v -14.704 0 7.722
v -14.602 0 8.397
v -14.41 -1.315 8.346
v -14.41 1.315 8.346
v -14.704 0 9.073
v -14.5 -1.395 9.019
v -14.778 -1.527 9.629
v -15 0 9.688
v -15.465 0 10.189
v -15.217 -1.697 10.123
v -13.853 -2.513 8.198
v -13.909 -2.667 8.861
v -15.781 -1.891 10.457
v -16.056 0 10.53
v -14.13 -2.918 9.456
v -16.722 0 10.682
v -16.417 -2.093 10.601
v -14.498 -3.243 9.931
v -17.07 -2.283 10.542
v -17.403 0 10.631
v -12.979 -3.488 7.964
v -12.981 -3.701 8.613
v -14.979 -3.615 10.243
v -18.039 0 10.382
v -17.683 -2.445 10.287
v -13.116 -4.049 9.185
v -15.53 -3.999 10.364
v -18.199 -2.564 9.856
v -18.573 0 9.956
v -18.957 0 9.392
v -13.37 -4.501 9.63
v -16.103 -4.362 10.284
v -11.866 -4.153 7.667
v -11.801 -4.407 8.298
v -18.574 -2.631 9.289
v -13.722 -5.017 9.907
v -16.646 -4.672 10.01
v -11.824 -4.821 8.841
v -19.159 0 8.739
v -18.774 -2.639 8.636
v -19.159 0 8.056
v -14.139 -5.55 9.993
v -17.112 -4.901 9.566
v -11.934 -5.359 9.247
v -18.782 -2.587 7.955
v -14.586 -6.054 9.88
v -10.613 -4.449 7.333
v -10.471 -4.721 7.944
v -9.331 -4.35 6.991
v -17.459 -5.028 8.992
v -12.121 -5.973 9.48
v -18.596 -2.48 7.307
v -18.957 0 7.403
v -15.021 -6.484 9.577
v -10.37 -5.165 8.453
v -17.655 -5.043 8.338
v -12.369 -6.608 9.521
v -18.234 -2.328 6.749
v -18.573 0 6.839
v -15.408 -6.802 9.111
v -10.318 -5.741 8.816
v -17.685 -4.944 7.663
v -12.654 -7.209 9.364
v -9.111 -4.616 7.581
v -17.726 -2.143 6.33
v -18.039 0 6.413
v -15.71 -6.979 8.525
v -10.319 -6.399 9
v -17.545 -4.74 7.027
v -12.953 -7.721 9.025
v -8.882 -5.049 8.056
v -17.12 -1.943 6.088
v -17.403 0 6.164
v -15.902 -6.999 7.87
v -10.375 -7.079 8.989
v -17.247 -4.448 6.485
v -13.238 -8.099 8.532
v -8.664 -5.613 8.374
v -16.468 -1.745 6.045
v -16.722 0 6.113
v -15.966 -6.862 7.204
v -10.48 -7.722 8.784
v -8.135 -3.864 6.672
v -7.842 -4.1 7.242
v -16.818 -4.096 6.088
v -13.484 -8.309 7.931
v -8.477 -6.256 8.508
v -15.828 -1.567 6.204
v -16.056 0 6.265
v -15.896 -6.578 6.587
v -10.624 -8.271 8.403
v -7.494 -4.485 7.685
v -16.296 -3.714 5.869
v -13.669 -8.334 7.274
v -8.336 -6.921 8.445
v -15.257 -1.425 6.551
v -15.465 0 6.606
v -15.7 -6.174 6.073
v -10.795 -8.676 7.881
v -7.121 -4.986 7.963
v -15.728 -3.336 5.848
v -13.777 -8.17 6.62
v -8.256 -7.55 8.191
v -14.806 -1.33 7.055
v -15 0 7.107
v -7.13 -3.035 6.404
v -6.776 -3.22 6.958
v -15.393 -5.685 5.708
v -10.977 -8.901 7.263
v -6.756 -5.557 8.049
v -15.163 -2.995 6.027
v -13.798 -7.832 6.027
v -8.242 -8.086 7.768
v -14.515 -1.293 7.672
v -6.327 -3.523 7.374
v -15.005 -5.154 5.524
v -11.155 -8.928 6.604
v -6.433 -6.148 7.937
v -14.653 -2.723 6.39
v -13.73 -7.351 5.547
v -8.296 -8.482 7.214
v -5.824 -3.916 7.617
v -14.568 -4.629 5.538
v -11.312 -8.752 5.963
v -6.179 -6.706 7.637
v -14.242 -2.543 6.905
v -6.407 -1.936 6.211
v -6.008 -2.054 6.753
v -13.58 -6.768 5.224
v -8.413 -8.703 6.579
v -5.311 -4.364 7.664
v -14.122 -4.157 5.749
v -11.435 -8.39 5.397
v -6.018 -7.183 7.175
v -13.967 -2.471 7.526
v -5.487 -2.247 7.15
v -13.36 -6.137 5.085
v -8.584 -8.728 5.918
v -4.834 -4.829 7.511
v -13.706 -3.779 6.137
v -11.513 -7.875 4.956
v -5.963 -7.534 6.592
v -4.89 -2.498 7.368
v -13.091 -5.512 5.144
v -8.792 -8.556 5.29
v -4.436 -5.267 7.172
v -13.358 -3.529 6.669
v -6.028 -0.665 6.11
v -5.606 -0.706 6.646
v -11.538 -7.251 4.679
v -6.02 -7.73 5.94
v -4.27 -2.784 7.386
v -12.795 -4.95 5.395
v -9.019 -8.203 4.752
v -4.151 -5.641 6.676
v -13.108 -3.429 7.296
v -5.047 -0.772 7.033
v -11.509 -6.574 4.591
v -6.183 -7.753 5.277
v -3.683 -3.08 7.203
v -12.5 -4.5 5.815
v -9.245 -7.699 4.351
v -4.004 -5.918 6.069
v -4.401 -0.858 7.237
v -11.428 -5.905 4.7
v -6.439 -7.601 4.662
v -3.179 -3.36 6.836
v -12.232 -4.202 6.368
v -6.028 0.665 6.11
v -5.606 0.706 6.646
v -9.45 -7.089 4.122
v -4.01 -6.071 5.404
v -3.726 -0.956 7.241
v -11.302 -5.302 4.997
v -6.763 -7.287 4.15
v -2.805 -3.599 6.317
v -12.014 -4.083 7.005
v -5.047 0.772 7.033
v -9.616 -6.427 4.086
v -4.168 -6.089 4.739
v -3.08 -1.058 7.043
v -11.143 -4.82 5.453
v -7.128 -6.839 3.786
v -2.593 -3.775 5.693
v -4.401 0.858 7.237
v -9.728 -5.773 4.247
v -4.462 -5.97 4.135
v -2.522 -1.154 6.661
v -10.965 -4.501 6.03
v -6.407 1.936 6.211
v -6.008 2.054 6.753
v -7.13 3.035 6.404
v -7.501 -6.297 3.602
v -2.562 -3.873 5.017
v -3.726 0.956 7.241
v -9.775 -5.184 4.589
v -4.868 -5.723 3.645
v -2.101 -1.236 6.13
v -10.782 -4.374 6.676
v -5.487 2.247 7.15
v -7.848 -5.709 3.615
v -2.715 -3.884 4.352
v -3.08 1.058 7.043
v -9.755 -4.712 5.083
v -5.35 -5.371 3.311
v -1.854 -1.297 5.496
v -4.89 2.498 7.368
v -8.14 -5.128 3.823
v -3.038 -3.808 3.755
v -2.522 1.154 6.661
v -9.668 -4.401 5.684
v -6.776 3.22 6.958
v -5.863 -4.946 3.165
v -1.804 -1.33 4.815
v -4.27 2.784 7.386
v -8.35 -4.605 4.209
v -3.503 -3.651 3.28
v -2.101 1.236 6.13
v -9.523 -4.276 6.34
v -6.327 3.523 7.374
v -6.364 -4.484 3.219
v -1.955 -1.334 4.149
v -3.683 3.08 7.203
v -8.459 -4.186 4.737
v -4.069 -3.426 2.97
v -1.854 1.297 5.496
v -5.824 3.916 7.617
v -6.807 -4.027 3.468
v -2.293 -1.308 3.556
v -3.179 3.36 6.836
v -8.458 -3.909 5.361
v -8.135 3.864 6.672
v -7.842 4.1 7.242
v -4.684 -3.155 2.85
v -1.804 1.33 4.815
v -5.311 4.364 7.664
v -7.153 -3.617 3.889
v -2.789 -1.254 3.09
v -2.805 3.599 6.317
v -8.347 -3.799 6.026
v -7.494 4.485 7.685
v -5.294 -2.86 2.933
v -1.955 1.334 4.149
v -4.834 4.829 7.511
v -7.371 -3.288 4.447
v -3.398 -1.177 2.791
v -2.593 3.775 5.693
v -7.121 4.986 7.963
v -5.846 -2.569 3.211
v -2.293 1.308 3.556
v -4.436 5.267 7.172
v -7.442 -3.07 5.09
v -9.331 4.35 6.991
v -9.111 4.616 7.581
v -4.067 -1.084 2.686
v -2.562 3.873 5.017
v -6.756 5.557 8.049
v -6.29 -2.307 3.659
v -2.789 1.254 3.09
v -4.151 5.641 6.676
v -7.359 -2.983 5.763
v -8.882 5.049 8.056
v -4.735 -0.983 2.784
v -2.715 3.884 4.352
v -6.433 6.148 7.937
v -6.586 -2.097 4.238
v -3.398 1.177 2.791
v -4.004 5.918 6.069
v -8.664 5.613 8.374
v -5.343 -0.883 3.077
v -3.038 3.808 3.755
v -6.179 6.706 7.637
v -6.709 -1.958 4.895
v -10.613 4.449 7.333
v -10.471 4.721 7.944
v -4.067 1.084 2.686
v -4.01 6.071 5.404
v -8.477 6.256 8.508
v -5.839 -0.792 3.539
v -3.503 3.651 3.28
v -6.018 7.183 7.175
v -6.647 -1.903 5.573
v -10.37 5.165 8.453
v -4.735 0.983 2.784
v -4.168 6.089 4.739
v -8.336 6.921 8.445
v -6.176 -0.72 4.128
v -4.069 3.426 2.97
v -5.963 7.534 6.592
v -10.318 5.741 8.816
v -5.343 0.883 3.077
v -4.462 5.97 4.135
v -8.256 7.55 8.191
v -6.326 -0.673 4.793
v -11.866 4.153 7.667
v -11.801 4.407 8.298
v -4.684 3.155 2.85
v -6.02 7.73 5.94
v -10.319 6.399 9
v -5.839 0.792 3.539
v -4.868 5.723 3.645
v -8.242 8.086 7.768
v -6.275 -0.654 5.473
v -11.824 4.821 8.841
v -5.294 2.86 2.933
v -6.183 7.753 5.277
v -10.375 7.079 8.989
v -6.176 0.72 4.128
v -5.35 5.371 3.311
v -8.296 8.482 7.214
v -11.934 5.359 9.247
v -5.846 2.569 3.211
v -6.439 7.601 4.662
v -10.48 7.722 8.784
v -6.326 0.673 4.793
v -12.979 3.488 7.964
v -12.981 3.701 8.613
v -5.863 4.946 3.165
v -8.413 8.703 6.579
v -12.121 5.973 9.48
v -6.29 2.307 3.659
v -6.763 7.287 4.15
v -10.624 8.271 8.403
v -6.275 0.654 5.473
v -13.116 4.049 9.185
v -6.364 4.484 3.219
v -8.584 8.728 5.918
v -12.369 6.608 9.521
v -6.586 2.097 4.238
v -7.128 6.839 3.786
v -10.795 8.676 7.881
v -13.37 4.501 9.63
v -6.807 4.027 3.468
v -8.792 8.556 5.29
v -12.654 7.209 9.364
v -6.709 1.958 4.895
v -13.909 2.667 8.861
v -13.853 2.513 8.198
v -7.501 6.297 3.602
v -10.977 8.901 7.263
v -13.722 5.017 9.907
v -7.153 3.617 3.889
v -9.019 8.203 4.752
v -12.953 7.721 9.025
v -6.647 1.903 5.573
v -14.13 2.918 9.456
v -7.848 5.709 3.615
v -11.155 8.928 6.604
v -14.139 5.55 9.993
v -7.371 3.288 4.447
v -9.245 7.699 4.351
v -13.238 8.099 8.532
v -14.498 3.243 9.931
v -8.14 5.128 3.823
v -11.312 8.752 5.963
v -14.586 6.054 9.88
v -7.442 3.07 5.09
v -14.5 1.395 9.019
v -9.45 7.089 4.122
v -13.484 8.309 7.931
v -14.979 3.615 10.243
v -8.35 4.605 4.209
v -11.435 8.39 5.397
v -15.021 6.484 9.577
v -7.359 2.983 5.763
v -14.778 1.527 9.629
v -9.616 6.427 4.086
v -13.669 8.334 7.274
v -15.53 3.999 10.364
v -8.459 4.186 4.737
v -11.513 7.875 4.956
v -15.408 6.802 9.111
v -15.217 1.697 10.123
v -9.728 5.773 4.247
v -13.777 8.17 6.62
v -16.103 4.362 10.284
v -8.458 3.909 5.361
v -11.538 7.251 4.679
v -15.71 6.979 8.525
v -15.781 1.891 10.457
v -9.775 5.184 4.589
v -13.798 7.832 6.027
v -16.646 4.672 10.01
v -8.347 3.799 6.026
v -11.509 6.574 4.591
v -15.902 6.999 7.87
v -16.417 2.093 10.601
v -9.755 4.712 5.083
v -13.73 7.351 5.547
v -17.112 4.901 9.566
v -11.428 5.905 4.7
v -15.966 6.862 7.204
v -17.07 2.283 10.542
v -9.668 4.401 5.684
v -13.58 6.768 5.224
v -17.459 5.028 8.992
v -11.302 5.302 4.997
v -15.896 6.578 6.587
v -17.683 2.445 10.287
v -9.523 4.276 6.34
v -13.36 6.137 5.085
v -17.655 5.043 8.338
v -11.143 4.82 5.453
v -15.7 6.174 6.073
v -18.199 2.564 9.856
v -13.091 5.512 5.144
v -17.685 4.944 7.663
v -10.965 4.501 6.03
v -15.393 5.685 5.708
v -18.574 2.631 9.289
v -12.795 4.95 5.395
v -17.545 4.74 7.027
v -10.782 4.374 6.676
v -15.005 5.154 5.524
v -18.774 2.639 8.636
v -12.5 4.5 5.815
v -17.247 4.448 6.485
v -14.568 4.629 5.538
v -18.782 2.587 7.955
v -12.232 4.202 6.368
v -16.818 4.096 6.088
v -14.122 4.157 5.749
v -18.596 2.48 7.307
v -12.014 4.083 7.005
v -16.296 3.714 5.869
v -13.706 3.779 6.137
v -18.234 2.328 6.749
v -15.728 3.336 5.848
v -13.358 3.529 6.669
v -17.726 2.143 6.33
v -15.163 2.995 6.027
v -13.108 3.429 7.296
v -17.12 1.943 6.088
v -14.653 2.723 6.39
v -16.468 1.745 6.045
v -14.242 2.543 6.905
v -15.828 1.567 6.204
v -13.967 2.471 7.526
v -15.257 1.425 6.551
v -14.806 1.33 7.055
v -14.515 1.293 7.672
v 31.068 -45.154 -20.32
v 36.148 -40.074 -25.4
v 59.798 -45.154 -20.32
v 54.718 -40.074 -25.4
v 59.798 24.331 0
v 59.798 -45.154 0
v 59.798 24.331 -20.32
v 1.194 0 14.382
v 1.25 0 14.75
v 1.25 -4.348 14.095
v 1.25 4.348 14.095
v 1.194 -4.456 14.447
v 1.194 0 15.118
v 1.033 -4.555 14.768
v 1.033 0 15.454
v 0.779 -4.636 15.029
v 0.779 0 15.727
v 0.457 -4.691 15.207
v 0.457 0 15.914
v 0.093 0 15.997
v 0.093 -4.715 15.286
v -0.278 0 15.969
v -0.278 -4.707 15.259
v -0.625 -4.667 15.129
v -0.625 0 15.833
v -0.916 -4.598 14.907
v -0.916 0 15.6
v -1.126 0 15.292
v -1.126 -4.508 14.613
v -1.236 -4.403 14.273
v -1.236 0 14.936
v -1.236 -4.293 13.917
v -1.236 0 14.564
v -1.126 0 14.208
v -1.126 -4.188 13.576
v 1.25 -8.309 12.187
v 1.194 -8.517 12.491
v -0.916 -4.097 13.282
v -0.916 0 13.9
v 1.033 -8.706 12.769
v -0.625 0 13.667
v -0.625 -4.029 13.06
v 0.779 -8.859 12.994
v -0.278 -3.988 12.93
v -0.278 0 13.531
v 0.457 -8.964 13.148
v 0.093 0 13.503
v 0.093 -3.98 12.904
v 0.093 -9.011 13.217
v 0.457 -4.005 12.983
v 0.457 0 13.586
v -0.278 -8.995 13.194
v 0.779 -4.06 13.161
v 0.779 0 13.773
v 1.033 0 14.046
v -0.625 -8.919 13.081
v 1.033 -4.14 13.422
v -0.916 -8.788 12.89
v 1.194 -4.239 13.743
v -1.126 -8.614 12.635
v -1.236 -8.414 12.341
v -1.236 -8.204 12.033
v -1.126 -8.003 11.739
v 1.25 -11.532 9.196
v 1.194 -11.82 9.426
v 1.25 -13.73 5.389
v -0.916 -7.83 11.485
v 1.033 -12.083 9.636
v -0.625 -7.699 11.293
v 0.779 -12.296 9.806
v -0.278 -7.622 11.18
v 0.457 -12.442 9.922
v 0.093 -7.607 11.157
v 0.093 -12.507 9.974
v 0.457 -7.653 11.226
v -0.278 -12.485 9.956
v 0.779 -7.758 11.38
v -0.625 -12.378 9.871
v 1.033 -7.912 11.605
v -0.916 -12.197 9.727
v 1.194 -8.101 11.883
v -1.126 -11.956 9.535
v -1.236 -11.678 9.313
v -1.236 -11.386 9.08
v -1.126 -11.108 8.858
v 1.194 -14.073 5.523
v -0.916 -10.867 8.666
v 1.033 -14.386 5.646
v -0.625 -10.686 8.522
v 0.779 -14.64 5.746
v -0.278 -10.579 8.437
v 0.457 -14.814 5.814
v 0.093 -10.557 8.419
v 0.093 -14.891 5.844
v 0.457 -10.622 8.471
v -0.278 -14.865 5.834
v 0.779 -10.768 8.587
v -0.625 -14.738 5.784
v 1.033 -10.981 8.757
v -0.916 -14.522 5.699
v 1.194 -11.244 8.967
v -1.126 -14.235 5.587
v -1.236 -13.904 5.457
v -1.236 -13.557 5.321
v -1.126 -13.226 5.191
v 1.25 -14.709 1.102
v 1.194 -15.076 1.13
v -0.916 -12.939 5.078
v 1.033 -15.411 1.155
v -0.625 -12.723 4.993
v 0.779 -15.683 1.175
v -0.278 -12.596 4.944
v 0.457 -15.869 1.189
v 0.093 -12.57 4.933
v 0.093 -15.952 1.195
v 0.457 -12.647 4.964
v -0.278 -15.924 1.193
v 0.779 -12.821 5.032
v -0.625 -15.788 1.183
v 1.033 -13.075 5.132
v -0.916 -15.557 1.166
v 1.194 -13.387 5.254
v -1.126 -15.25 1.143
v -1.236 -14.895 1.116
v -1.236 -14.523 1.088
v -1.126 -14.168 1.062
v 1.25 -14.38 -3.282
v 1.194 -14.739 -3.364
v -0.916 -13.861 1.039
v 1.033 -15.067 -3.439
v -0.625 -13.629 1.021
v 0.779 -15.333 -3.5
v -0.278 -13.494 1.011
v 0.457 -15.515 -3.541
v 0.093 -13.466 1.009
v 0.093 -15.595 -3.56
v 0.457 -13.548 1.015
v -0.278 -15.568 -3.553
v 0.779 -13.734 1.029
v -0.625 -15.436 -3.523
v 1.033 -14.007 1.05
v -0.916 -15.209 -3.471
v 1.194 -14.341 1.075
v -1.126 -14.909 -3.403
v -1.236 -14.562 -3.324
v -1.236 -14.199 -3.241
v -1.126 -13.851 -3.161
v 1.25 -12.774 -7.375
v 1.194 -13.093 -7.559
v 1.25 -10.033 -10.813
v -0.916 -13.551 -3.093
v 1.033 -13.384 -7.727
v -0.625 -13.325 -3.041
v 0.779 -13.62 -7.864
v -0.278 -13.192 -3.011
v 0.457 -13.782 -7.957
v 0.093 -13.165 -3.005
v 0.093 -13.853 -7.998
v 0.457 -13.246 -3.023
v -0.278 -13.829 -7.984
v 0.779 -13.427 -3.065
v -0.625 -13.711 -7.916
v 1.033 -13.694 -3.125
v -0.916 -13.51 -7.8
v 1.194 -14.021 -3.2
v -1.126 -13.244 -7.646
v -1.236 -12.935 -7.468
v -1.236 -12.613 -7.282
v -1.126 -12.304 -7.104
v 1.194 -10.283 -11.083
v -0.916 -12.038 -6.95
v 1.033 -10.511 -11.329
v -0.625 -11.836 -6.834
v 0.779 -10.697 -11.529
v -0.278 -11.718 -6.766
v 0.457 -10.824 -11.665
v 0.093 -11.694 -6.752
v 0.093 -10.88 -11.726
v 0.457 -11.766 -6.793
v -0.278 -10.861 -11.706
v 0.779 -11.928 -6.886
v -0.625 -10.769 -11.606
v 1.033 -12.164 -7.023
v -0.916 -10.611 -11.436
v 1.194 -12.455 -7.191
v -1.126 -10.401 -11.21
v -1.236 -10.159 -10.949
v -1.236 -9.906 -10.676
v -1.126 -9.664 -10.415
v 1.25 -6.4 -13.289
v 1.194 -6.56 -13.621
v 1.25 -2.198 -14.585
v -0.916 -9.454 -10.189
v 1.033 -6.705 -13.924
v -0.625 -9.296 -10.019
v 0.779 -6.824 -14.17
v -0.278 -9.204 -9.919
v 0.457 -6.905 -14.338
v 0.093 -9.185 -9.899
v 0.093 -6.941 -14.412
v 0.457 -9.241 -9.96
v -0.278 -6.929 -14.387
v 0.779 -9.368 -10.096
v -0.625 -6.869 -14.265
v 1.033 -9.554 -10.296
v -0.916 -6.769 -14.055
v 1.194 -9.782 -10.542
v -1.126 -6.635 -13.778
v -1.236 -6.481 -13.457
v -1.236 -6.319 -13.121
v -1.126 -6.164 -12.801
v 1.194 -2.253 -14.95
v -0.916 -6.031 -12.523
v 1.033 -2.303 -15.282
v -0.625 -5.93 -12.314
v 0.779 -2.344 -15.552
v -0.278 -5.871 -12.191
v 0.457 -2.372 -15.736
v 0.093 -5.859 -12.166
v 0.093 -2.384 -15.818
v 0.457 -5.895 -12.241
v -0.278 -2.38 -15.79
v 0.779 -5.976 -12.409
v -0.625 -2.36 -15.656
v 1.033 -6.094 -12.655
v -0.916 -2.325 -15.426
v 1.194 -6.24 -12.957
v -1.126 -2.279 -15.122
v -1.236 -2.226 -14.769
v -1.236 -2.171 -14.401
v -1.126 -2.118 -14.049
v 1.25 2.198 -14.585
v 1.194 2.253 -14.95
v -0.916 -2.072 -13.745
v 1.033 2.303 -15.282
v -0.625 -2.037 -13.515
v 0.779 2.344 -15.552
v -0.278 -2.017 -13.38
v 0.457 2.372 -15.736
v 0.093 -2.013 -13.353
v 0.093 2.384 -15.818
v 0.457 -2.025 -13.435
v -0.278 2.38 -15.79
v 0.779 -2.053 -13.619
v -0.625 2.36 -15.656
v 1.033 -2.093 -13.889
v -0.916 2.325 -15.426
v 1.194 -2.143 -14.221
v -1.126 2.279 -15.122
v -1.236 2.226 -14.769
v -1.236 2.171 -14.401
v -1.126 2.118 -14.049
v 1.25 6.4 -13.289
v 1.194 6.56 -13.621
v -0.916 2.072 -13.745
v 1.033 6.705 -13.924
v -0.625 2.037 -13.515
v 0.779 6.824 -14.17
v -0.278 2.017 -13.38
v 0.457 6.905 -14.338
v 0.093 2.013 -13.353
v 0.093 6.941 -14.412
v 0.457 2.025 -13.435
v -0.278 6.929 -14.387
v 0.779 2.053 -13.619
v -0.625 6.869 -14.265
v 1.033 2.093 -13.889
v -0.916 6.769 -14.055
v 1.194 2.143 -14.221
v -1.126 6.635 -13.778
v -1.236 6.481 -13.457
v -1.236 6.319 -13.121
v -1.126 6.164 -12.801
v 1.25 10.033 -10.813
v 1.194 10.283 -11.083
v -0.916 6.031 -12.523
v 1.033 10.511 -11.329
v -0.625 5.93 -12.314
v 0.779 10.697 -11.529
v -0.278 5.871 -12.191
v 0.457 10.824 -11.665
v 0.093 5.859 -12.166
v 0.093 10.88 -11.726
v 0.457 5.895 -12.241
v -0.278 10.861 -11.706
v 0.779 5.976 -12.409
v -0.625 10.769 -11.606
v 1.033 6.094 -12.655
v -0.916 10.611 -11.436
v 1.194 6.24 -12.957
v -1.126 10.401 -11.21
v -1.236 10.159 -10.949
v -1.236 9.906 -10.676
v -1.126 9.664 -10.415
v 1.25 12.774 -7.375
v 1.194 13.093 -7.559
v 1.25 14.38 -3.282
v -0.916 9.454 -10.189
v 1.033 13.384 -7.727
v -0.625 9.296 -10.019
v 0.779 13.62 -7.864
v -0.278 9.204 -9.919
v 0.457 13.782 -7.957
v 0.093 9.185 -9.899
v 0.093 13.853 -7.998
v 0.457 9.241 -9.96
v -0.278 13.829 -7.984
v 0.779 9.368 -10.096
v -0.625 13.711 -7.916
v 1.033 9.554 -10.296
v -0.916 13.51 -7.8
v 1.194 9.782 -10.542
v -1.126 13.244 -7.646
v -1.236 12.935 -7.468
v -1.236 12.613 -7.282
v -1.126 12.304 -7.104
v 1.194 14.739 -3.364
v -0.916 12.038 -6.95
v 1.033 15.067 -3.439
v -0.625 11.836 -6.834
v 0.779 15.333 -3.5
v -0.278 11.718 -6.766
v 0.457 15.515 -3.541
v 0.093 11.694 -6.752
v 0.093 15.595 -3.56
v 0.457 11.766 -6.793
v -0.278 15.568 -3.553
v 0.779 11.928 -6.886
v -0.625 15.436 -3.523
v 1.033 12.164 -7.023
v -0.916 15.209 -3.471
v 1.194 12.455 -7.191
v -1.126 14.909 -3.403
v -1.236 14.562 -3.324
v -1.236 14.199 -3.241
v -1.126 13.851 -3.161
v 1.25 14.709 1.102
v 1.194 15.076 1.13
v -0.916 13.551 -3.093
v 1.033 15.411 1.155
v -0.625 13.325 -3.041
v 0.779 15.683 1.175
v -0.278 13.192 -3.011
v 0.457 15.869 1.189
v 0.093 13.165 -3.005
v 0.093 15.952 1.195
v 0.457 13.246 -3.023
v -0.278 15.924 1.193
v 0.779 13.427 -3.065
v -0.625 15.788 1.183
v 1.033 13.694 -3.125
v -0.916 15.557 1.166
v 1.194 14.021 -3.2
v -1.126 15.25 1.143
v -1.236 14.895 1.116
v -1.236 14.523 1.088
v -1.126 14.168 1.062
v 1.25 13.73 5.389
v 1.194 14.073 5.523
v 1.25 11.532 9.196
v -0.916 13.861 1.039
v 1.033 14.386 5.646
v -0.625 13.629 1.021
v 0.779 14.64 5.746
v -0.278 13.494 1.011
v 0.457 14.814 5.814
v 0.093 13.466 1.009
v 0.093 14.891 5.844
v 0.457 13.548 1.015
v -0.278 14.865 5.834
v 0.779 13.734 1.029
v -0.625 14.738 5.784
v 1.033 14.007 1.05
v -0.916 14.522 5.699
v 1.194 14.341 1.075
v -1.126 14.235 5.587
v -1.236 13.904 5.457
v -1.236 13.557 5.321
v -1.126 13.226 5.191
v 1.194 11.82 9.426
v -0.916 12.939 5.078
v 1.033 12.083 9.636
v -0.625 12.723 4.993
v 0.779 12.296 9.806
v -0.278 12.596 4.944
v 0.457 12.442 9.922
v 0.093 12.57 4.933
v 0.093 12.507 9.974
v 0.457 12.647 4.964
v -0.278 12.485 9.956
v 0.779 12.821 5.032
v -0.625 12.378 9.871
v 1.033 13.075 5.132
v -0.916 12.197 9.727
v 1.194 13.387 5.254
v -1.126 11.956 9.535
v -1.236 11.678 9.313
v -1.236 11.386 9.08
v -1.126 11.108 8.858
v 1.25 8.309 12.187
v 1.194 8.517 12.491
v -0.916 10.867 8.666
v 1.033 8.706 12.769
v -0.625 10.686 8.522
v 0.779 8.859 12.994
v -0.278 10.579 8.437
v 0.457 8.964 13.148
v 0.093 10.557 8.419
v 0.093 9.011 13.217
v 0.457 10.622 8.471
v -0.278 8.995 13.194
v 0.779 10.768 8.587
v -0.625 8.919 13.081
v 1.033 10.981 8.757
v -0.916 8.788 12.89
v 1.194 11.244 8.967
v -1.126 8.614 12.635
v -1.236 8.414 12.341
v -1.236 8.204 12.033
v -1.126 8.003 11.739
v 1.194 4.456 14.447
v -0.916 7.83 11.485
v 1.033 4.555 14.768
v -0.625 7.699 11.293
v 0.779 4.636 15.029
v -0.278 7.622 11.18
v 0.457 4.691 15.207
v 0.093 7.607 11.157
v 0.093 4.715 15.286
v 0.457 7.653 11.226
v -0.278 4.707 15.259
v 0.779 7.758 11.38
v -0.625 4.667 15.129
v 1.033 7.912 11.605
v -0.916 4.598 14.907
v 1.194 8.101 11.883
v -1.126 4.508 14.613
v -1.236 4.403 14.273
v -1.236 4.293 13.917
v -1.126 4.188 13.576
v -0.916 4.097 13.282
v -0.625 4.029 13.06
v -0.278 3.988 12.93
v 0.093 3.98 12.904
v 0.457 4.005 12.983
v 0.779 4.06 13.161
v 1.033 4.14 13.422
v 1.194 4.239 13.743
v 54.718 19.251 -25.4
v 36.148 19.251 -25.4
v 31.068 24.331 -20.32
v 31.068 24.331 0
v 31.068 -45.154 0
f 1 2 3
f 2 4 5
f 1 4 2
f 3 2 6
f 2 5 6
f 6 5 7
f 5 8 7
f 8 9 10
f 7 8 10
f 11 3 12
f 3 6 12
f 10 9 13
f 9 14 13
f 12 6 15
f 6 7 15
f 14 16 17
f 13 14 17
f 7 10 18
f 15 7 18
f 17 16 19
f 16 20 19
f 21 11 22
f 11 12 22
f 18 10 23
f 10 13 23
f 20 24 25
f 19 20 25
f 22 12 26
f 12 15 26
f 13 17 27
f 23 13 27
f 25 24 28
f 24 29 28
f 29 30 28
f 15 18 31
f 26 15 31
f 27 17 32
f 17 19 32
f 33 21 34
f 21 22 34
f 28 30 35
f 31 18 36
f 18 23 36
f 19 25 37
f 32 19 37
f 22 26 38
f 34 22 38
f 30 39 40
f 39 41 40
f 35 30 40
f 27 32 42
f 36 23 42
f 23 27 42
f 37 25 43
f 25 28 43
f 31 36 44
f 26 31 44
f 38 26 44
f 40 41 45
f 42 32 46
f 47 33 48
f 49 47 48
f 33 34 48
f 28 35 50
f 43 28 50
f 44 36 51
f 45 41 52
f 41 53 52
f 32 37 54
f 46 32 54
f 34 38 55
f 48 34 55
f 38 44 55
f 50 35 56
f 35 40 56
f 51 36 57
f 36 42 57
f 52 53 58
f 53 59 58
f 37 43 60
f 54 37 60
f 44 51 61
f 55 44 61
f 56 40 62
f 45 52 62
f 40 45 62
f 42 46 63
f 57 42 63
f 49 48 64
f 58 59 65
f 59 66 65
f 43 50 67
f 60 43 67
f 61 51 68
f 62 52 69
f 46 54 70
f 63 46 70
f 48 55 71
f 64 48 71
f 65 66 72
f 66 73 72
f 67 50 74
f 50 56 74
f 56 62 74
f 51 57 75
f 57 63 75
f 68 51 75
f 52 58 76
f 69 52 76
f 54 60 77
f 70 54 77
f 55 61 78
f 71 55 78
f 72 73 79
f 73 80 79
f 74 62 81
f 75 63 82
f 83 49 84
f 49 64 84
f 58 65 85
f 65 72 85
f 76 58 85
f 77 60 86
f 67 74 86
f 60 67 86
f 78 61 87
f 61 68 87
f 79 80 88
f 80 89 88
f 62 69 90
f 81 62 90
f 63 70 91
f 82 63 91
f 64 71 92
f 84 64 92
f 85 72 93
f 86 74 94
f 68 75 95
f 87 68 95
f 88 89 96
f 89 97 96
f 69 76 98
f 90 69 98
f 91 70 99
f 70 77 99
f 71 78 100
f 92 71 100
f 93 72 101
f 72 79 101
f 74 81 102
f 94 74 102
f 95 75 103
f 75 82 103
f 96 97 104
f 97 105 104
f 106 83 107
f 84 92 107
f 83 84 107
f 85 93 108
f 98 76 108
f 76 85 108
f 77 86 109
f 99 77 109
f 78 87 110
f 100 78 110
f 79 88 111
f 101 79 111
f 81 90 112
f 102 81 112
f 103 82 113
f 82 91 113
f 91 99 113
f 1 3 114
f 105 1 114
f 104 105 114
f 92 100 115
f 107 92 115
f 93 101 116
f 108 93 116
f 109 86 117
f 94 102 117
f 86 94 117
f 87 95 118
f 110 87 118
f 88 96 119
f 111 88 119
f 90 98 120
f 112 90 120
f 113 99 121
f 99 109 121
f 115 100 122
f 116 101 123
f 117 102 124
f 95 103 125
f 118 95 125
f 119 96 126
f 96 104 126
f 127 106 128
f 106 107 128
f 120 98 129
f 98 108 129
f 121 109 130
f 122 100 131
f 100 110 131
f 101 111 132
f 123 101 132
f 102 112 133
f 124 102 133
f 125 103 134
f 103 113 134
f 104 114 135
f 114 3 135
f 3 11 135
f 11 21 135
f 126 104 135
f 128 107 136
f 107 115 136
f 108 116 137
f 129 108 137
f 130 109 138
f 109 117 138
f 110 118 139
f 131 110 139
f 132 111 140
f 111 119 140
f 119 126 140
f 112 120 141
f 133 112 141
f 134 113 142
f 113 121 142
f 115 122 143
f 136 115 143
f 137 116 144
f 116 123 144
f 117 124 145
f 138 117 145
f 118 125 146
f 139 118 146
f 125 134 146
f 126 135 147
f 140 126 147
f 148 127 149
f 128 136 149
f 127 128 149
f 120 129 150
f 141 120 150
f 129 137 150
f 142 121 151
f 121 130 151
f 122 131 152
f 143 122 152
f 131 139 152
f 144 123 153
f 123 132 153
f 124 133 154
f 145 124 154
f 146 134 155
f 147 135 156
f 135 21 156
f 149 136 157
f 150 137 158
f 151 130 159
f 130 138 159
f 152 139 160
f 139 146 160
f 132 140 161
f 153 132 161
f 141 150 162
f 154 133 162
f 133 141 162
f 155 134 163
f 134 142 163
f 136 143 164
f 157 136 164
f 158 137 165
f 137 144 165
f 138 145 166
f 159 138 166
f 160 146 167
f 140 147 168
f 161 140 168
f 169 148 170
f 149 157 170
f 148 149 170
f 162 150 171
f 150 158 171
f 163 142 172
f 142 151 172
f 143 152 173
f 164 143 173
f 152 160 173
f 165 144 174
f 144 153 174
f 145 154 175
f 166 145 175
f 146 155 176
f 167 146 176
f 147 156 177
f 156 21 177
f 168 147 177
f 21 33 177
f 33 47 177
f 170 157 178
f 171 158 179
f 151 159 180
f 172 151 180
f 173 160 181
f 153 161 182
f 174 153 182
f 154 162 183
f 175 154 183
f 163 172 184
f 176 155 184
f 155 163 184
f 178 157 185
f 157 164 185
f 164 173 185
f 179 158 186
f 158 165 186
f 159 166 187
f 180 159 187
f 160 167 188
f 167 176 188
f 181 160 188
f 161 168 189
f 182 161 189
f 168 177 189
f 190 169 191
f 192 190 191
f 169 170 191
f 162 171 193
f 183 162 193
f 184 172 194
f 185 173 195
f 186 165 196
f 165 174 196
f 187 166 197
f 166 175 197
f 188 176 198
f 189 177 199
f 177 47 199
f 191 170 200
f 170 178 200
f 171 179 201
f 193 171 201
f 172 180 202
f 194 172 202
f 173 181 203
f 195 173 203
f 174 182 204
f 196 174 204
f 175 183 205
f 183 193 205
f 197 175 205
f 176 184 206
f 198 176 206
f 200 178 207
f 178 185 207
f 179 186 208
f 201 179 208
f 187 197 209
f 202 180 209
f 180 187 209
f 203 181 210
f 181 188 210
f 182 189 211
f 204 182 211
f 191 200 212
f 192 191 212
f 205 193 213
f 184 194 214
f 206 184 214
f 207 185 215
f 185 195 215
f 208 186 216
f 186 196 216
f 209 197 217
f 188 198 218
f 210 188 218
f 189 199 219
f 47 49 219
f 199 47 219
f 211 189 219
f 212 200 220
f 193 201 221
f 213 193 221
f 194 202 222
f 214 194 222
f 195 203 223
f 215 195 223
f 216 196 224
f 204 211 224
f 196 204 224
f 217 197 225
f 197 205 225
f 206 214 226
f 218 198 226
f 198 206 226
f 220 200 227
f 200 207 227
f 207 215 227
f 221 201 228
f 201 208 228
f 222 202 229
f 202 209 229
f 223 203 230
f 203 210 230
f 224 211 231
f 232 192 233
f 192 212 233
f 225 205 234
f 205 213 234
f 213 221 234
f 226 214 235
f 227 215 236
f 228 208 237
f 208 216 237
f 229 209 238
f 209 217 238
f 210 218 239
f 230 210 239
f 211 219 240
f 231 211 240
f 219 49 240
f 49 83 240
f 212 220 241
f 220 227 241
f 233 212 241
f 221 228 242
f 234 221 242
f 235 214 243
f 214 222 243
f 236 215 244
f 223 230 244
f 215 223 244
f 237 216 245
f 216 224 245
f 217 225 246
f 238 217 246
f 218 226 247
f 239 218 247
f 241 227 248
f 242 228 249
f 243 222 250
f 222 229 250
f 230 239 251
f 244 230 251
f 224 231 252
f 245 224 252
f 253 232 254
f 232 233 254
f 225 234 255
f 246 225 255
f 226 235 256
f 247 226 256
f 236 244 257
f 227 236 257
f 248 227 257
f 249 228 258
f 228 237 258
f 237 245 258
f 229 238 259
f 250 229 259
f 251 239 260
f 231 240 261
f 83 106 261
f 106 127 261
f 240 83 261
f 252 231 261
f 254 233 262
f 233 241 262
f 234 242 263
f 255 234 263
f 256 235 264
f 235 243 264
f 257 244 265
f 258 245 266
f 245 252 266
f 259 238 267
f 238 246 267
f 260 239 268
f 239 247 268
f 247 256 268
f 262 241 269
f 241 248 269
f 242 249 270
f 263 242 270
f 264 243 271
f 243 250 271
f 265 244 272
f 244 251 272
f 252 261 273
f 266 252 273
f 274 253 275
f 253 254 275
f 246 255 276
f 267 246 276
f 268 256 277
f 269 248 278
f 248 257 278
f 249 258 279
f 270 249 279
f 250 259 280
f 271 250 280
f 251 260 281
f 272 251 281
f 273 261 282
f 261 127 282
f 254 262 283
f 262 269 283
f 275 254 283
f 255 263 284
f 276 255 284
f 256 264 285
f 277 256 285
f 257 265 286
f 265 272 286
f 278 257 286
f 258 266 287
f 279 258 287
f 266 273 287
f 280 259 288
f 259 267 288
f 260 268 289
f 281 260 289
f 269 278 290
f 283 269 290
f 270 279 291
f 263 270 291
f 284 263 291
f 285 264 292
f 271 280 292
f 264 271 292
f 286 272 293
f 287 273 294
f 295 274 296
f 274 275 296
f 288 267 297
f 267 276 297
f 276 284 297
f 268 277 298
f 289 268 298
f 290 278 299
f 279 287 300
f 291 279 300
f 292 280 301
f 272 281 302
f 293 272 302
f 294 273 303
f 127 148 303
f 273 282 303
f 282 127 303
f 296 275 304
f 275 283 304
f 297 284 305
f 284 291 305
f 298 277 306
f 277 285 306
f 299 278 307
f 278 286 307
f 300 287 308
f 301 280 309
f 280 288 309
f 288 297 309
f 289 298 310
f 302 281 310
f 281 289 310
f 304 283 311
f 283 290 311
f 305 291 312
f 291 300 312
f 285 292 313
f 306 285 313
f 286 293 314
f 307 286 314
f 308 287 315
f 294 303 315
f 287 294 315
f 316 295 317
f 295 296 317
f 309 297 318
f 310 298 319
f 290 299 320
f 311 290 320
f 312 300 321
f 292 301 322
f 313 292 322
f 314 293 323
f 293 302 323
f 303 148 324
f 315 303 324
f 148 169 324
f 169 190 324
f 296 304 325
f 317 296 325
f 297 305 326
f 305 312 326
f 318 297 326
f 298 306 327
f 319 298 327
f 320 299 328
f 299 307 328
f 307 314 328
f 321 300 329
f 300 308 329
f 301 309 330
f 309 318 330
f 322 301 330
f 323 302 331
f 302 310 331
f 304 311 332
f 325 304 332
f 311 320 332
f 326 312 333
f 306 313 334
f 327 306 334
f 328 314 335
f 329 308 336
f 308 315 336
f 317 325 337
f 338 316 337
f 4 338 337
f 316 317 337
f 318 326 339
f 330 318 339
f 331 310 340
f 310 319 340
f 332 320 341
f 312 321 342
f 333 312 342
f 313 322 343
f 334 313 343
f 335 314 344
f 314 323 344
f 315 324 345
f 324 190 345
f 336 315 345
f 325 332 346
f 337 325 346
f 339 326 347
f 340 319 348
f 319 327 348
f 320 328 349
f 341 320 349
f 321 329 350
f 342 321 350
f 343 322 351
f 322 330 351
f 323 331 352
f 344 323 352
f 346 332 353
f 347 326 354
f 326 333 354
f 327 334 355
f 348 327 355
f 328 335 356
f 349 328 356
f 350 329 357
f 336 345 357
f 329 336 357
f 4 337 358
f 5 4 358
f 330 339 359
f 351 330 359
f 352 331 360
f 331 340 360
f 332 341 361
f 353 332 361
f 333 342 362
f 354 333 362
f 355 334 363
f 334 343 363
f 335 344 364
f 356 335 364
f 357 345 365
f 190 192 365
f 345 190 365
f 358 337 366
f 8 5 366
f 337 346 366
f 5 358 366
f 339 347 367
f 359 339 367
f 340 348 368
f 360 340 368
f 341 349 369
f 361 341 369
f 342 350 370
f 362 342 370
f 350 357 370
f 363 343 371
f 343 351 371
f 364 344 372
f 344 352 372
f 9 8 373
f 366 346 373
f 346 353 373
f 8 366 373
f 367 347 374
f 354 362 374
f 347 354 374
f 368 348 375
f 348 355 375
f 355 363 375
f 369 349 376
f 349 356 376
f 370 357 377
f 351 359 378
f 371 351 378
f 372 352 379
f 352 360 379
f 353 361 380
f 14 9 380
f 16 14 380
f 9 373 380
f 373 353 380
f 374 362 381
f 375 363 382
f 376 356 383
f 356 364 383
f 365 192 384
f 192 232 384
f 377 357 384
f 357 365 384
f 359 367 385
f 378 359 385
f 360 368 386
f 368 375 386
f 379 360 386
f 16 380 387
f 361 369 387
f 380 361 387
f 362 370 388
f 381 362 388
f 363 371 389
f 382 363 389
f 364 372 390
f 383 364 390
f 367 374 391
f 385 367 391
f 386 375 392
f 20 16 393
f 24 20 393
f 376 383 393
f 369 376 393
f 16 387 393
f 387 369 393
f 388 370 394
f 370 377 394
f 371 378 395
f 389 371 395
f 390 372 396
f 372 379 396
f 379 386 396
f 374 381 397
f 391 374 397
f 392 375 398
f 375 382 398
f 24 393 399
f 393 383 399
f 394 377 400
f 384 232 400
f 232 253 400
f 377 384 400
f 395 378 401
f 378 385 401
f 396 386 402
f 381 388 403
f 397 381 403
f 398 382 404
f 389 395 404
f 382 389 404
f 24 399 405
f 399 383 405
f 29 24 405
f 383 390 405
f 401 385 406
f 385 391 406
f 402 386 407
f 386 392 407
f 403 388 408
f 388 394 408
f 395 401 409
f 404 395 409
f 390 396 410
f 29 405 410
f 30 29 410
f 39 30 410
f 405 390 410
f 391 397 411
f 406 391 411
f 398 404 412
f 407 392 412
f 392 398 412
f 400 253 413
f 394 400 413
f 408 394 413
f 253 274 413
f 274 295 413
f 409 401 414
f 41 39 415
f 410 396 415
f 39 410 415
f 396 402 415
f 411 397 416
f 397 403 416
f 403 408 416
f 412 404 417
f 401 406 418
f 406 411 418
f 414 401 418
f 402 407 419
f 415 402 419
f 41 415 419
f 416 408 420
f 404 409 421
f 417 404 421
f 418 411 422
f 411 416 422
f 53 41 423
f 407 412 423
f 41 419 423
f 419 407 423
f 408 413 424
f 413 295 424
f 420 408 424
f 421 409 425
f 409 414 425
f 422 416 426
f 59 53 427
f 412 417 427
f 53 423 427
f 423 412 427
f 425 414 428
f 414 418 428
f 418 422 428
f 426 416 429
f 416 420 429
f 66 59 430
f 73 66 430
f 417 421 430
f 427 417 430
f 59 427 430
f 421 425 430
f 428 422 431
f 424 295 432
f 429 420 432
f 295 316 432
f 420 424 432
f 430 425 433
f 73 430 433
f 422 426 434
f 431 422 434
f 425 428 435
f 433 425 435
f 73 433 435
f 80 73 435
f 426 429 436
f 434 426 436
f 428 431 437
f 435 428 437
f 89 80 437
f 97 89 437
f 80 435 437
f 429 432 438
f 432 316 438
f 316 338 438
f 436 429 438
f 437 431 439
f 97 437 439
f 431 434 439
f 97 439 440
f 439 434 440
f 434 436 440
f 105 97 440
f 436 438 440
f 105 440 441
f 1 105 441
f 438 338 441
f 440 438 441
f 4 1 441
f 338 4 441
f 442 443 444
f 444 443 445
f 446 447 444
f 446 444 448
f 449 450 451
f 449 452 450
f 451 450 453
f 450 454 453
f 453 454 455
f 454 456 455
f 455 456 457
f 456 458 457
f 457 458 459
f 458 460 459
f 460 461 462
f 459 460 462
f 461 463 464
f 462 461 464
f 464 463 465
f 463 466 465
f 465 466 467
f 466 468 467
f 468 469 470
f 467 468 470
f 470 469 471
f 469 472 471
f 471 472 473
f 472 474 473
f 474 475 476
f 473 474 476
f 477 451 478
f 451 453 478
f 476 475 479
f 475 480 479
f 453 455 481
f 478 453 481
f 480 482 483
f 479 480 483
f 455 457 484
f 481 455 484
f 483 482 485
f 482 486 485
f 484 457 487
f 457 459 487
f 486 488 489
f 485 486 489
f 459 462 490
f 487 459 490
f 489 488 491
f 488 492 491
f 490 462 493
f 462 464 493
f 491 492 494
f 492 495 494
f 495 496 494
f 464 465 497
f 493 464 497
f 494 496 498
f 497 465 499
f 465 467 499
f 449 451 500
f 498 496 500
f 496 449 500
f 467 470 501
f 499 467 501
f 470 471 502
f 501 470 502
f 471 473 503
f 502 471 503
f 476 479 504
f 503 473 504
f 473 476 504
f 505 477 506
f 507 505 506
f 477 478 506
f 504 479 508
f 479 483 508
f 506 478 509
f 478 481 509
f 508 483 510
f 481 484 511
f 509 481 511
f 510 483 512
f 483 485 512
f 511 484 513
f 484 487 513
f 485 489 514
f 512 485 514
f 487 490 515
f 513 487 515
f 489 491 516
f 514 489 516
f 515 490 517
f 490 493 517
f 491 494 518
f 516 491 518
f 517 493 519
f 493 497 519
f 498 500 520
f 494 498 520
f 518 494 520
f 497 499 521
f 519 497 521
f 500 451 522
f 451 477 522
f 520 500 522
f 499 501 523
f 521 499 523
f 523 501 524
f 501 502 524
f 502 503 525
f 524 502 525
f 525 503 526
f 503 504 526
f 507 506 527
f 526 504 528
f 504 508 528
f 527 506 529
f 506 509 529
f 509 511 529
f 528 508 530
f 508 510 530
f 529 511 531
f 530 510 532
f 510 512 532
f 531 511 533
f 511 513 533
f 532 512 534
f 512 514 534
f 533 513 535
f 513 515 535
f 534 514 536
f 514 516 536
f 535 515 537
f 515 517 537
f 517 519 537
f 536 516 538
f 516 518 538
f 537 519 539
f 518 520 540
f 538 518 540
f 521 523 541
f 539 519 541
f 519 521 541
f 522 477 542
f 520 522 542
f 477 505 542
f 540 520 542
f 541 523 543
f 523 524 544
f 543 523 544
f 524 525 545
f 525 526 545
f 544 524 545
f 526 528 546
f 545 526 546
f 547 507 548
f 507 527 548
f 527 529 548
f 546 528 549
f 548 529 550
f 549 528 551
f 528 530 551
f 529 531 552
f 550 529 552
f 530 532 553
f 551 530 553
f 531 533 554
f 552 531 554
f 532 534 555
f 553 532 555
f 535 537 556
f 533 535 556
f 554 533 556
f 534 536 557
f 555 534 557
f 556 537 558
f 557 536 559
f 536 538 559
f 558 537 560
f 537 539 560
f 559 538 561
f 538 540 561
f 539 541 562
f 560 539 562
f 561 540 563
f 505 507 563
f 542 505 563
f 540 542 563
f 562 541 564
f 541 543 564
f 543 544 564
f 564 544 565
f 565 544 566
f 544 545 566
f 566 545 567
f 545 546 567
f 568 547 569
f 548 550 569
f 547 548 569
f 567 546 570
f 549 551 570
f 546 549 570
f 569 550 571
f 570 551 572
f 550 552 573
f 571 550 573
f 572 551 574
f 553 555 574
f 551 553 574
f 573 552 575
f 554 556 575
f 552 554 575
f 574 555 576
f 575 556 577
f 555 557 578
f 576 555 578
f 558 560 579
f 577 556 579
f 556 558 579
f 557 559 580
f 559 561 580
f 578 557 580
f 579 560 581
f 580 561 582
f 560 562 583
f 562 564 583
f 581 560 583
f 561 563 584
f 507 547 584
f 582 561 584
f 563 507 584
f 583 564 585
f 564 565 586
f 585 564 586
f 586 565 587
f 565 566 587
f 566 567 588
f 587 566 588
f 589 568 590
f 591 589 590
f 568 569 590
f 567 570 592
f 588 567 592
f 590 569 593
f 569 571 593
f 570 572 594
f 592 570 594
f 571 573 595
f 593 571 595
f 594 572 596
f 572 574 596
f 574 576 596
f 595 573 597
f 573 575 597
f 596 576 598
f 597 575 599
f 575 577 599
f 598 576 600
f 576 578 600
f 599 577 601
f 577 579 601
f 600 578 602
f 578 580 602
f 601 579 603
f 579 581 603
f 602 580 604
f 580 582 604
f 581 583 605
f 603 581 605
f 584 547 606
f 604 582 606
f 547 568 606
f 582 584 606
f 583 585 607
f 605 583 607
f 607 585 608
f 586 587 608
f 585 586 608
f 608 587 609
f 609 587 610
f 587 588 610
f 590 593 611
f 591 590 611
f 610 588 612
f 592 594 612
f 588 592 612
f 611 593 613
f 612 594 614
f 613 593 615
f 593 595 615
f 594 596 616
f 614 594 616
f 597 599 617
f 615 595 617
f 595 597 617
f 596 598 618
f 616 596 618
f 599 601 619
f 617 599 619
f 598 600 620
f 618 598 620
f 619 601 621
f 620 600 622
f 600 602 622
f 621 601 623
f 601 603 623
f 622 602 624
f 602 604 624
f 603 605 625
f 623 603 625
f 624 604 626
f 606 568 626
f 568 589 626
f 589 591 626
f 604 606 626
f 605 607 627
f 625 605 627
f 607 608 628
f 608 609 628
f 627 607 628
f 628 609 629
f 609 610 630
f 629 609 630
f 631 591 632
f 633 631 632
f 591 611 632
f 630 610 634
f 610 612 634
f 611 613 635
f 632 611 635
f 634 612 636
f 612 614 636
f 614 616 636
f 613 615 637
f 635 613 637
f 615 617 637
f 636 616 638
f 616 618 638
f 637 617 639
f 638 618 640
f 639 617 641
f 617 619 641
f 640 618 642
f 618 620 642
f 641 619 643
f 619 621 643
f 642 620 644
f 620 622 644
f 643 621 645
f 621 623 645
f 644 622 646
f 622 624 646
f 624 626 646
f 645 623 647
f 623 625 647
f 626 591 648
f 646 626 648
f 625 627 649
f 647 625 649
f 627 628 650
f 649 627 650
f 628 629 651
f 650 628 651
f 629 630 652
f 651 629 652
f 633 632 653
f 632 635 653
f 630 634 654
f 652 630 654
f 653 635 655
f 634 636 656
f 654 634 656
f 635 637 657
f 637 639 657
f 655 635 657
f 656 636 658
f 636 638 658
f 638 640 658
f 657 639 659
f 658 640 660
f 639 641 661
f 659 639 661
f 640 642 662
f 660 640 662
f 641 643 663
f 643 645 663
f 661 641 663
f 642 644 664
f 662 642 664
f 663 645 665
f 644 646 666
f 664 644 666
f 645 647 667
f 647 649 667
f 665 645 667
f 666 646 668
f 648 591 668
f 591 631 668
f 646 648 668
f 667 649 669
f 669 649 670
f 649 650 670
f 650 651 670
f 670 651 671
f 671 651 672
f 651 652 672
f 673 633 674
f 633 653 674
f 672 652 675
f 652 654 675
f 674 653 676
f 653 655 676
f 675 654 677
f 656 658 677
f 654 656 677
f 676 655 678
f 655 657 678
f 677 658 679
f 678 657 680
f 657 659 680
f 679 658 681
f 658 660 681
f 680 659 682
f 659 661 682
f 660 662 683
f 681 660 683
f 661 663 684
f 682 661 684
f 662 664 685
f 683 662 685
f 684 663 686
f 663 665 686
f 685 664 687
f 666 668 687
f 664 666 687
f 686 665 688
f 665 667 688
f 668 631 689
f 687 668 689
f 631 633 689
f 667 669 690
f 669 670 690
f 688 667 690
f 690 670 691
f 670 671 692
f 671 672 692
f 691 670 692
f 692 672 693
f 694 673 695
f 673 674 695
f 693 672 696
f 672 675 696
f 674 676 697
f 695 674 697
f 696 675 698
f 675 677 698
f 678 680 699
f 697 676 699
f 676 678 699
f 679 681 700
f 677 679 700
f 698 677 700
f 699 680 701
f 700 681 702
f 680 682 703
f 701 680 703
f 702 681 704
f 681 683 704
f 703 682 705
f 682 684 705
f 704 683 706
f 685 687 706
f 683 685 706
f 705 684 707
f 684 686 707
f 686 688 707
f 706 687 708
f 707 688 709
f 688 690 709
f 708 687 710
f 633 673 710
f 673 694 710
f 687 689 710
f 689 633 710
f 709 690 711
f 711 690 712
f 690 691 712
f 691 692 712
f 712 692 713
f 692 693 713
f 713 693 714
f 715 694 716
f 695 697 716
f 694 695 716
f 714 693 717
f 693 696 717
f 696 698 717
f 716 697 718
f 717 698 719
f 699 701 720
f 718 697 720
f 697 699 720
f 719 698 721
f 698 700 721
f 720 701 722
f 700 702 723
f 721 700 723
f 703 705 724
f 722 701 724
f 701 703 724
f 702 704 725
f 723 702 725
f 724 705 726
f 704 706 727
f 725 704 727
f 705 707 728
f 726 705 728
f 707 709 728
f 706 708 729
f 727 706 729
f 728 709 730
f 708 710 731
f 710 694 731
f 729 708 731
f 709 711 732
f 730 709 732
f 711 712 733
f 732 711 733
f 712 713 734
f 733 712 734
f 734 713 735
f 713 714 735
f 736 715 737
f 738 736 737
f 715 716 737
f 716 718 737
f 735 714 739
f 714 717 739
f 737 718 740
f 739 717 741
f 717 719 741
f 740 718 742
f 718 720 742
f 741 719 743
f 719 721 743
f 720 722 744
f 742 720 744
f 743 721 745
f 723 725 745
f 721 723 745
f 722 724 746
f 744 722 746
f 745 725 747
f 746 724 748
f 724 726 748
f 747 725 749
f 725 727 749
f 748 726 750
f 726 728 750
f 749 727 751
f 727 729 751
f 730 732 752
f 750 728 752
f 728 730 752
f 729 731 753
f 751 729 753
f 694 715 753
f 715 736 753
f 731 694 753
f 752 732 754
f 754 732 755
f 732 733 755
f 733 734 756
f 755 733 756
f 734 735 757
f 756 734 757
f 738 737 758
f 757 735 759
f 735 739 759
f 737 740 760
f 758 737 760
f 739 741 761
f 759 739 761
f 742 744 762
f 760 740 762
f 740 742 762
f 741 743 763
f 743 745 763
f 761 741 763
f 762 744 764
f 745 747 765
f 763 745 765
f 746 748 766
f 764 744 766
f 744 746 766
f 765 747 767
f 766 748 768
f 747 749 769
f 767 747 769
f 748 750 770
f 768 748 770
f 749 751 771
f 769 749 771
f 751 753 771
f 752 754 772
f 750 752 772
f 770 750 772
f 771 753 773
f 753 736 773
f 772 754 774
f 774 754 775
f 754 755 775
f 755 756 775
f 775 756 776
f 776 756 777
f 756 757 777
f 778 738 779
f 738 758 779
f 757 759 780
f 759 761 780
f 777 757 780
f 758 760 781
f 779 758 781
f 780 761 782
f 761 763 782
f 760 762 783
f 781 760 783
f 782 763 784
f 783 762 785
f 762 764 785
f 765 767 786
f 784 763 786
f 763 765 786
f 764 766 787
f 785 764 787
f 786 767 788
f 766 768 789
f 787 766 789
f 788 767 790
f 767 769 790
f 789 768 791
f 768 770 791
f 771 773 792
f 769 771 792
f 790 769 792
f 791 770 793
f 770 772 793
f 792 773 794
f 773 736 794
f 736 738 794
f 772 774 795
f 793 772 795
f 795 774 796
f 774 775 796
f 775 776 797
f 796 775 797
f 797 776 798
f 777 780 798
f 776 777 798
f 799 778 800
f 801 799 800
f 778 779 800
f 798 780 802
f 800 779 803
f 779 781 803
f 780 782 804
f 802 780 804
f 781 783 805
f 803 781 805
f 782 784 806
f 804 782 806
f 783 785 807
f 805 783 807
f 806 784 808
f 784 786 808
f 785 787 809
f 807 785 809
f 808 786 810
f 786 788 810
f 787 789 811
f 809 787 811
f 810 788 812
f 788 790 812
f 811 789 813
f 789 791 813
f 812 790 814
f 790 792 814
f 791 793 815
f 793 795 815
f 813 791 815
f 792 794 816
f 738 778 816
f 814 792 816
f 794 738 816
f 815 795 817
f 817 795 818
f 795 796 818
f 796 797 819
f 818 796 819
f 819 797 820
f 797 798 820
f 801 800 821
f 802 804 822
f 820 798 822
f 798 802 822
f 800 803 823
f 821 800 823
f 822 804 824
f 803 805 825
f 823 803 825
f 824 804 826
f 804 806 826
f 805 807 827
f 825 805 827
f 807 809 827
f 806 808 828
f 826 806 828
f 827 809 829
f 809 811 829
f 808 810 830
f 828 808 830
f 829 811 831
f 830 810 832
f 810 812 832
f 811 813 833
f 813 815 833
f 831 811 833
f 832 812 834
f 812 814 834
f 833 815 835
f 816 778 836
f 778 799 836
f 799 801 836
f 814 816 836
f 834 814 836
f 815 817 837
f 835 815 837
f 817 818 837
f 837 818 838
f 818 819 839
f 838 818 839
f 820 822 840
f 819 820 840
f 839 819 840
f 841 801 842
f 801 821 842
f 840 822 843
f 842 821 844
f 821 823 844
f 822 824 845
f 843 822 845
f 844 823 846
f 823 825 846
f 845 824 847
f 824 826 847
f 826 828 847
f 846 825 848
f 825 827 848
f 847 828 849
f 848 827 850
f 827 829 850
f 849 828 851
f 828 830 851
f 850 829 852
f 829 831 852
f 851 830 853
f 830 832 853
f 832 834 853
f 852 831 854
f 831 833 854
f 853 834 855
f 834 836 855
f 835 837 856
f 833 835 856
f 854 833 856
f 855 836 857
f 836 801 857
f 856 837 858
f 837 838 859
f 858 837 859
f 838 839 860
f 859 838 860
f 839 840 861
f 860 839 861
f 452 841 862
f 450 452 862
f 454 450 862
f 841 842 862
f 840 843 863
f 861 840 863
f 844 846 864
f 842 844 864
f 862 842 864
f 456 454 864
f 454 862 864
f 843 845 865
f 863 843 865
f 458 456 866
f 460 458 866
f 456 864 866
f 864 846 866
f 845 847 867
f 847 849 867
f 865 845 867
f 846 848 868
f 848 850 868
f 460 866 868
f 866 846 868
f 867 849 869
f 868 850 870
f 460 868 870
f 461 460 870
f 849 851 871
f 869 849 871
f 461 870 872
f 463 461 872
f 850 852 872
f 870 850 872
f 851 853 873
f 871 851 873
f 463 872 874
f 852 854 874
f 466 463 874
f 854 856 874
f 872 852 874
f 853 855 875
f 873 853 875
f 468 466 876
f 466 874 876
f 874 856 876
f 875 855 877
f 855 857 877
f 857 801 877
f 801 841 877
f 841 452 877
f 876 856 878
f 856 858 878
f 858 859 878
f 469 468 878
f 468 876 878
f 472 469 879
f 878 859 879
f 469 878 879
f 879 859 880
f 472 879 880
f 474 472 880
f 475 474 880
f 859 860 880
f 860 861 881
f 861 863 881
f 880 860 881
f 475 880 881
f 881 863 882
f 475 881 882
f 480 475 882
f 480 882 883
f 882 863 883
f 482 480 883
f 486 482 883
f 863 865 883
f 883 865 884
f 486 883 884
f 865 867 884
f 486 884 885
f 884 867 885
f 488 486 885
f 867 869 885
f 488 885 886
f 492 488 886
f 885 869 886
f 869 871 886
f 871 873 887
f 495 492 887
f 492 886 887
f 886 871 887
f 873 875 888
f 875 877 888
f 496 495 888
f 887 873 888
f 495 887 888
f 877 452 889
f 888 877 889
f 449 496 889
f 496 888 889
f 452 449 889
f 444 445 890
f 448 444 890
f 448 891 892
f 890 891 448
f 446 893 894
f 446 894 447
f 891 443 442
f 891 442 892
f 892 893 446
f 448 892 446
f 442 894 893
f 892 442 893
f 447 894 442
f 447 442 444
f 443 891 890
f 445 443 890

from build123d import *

# Parameters (mm, degrees)
F0_R     = 1.25
F4_R     = 2.291115
F6_W     = 28.729727
F6_H     = 69.484845
F7_DEPTH = 25.4
F2_SIZE  = 5.08


with BuildPart() as f1:
    # F0 (on Front) → F1 (revolve)
    with BuildSketch(Plane.XZ):
        with Locations((0, 14.75)):
            Circle(F0_R)
    revolve(axis=Axis((3.545721, 0, 0), (1, 0, 0)))


with BuildPart() as f5:
    # F4 (on face) → F5 (revolve)
    with BuildSketch(Plane.XZ):
        with Locations((-16.892994, 8.397464)):
            Circle(F4_R)
    revolve(axis=Axis((-17.68117, 0, -20.453736), (0.257776, 0, 0.966205)))


with BuildPart() as f7:
    # F6 (on Top) → F7 (new body)
    with BuildSketch(Plane.XY):
        with Locations((45.432769, -10.411427)):
            Rectangle(F6_W, F6_H)
    extrude(amount=-F7_DEPTH)

    # F2
    f2_edges = [f7.edges().sort_by_distance(p)[0] for p in [
        (59.797633, -10.411426, -25.4),
        (45.43277, -45.153849, -25.4),
        (45.43277, 24.330996, -25.4),
        (31.067906, -10.411426, -25.4),
    ]]
    chamfer(f2_edges, length=F2_SIZE)


solid = Compound([f1.part, f5.part, f7.part])
